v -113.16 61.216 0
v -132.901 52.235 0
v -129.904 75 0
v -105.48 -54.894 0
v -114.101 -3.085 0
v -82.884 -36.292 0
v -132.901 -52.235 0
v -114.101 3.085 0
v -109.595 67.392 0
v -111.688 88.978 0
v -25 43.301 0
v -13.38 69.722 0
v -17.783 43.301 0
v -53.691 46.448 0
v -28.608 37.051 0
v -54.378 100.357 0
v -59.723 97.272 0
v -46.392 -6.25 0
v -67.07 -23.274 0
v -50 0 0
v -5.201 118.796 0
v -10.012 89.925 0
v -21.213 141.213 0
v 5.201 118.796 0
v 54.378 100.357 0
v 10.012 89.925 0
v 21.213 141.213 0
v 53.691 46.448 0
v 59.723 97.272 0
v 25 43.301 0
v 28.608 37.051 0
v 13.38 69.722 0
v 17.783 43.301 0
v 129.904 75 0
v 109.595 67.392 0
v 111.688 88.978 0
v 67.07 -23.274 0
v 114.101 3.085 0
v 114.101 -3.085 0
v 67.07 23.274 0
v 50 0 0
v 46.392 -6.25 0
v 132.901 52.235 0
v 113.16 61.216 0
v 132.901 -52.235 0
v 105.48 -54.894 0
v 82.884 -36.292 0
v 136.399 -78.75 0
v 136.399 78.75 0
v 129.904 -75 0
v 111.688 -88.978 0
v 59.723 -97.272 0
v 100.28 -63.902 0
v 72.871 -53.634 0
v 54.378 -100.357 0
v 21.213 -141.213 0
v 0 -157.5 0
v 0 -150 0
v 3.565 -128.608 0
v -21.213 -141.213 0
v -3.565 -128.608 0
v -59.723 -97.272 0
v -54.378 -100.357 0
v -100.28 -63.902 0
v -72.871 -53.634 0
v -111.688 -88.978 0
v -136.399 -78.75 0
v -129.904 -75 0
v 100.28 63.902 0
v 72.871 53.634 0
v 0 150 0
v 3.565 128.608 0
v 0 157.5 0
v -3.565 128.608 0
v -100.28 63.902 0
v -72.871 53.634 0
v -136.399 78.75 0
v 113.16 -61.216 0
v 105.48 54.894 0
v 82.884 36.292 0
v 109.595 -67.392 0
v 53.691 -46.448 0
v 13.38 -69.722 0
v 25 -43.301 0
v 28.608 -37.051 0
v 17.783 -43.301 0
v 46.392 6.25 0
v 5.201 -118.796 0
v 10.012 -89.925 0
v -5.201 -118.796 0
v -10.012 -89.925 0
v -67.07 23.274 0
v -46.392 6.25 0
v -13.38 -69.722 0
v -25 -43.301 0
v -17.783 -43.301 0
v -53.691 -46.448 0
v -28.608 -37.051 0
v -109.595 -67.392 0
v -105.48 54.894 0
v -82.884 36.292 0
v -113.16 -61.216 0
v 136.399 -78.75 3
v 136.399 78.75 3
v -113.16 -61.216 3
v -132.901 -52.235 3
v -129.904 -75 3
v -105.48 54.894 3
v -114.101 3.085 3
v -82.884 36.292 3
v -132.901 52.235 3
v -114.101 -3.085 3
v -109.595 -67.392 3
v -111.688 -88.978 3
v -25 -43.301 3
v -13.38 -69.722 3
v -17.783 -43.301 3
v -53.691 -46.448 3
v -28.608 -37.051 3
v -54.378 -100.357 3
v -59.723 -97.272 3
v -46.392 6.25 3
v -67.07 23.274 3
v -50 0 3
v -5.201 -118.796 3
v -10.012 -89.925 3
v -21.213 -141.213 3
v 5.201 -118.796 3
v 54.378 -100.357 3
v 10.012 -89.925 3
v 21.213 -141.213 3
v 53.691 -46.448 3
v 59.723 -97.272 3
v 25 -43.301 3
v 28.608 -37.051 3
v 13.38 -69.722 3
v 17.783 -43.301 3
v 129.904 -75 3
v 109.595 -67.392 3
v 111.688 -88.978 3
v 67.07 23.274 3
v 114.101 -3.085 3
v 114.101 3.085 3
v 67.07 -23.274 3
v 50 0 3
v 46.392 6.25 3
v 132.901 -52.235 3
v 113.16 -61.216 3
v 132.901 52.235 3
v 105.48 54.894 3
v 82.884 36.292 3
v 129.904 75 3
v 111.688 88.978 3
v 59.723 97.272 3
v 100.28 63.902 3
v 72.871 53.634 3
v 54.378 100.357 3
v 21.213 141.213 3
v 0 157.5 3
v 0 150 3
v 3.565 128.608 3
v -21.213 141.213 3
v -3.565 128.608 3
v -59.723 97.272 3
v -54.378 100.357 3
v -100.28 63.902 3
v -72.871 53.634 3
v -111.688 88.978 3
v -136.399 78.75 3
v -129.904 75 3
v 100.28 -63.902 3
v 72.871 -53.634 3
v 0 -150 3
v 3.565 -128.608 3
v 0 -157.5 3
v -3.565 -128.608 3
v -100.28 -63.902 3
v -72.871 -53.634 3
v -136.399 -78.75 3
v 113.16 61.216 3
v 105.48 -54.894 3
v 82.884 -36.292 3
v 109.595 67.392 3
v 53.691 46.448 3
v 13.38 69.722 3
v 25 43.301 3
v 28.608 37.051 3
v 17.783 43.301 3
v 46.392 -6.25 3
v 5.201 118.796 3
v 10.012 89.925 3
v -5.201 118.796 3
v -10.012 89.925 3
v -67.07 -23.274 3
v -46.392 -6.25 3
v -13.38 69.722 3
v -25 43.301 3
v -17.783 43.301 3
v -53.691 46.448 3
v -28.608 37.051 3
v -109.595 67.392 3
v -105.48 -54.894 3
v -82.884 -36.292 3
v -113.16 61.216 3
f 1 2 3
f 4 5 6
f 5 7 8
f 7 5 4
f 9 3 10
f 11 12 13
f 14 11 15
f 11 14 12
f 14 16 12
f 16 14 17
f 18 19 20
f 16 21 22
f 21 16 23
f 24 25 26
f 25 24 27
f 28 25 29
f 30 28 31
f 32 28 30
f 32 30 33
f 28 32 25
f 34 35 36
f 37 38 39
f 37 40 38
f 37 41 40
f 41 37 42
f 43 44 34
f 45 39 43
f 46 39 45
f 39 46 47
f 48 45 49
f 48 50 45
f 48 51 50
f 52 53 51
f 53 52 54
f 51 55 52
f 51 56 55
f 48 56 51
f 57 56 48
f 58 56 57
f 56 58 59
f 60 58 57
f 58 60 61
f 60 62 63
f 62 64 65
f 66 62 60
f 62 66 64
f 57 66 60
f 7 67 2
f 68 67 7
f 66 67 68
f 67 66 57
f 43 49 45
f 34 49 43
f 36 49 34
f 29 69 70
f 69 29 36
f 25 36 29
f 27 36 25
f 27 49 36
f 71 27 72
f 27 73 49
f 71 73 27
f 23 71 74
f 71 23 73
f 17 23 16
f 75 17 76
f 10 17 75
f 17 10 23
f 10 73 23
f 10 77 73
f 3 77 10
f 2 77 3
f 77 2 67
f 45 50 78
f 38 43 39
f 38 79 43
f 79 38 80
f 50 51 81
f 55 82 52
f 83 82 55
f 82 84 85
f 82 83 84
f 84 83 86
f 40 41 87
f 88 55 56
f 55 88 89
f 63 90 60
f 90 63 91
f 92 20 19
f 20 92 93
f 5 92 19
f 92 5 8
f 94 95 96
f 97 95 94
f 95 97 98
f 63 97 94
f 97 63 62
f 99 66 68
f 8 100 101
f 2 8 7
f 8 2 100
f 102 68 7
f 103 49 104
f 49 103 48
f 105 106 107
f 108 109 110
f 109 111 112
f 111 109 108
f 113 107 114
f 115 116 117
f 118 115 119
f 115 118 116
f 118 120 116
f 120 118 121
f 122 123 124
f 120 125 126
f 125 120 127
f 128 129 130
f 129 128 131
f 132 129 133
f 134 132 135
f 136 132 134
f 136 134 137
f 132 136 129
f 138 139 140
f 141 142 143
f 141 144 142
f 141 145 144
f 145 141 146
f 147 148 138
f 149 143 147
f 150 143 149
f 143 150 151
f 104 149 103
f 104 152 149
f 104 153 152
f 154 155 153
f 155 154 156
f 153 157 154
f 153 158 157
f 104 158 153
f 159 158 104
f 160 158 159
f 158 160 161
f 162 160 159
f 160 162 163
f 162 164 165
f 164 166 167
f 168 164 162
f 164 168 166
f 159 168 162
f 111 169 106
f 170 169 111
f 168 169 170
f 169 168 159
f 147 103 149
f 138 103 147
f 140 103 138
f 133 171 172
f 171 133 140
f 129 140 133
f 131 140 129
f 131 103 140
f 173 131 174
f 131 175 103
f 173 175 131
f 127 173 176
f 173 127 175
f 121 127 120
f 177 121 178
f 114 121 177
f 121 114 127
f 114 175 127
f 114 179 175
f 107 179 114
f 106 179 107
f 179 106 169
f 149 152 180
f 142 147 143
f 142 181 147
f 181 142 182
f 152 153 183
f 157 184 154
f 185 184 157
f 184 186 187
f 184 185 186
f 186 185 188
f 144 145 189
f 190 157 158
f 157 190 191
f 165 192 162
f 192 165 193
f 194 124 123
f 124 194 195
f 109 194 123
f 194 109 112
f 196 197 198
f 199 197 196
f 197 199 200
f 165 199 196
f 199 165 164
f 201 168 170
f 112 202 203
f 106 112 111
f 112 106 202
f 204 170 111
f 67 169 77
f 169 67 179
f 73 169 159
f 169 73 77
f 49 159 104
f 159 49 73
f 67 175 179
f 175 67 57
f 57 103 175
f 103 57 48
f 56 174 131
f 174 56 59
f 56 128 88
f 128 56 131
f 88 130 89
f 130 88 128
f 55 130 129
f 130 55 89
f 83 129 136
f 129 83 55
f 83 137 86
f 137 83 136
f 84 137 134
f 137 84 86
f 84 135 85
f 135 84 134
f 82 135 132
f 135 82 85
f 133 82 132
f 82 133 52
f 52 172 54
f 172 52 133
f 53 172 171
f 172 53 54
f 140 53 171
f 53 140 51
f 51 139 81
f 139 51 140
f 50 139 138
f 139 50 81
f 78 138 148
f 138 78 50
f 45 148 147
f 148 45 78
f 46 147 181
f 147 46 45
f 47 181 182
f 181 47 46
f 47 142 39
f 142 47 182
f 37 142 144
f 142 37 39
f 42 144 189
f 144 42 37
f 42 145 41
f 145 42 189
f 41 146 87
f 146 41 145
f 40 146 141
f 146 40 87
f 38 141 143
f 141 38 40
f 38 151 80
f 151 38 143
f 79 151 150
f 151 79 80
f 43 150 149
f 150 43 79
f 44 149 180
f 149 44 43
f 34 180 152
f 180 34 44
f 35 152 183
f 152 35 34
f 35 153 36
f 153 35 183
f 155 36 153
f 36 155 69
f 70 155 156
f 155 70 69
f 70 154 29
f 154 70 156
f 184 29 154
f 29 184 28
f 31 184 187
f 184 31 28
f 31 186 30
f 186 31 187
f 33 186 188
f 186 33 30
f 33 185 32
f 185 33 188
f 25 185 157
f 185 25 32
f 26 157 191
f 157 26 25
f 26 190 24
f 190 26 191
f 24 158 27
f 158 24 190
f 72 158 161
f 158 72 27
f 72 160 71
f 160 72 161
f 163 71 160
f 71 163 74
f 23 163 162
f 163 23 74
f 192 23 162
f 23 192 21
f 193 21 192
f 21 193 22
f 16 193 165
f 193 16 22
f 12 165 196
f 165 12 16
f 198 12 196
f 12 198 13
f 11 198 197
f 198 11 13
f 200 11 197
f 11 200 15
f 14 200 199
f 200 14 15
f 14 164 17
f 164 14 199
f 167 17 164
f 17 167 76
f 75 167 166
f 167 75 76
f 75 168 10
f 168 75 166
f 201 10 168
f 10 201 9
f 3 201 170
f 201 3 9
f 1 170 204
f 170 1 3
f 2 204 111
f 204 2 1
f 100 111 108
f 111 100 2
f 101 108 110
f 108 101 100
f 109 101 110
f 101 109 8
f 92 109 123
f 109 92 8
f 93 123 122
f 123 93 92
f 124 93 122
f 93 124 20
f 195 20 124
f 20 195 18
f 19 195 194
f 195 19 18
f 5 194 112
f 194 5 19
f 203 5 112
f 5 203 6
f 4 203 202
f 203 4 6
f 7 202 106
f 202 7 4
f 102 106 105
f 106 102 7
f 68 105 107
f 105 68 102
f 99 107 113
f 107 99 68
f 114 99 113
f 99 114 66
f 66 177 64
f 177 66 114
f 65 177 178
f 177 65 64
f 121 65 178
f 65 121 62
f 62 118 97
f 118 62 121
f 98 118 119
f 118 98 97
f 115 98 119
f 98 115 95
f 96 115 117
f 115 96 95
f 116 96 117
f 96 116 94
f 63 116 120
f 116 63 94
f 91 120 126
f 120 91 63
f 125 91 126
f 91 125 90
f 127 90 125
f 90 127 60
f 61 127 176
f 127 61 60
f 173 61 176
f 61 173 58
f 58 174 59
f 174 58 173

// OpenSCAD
n=6; //Snowflakes are hexagonal.
y=150;//determines height of the triangles.
x=25;//determines width of the triangles.
height=3; //thickness of stencil.
tierx1=.5;//multiplyer of the width of first tier triangles.
tiery1=.4;//multiplyer of the height of first tier triangles.
tierx2=.2;//multiplyer of the width of second tier triangles.
tiery2=.2;//multiplyer of height of second tier triangles.
tier1angle=65;//turn angle of first tier triangles.
tier2angle=45;//turn angle of second tier triangles.

difference()
{

linear_extrude(height=height)
rotate([0,0,360/(2*n)])circle(y+.05*y,$fn=n);
echo(2*(y+.05*y));//diameter of stencil.

translate([0,0,-5])
linear_extrude(height=height+10)
union()
{
circle(y/3,$fn=n);

	for(i=[0:n])
	{
	rotate([0,0,i*360/n])
	{
		polygon([[x,0],[-x,0],[0,y]]);

		translate([0,y/2,0])rotate([0,0,tier1angle])
		polygon([[tierx1*x,0],[-tierx1*x,0],[0,tiery1*y]]);

		translate([0,y/2,0])rotate([0,0,-tier1angle])
		polygon([[tierx1*x,0],[-tierx1*x,0],[0,tiery1*y]]);

		translate([0,(4*y)/5,0])rotate([0,0,tier2angle])
		polygon([[tierx2*x,0],[-tierx2*x,0],[0,tiery2*y]]);

		translate([0,(4*y)/5,0])rotate([0,0,-tier2angle])
		polygon([[tierx2*x,0],[-tierx2*x,0],[0,tiery2*y]]);
		}
	}
}
}
